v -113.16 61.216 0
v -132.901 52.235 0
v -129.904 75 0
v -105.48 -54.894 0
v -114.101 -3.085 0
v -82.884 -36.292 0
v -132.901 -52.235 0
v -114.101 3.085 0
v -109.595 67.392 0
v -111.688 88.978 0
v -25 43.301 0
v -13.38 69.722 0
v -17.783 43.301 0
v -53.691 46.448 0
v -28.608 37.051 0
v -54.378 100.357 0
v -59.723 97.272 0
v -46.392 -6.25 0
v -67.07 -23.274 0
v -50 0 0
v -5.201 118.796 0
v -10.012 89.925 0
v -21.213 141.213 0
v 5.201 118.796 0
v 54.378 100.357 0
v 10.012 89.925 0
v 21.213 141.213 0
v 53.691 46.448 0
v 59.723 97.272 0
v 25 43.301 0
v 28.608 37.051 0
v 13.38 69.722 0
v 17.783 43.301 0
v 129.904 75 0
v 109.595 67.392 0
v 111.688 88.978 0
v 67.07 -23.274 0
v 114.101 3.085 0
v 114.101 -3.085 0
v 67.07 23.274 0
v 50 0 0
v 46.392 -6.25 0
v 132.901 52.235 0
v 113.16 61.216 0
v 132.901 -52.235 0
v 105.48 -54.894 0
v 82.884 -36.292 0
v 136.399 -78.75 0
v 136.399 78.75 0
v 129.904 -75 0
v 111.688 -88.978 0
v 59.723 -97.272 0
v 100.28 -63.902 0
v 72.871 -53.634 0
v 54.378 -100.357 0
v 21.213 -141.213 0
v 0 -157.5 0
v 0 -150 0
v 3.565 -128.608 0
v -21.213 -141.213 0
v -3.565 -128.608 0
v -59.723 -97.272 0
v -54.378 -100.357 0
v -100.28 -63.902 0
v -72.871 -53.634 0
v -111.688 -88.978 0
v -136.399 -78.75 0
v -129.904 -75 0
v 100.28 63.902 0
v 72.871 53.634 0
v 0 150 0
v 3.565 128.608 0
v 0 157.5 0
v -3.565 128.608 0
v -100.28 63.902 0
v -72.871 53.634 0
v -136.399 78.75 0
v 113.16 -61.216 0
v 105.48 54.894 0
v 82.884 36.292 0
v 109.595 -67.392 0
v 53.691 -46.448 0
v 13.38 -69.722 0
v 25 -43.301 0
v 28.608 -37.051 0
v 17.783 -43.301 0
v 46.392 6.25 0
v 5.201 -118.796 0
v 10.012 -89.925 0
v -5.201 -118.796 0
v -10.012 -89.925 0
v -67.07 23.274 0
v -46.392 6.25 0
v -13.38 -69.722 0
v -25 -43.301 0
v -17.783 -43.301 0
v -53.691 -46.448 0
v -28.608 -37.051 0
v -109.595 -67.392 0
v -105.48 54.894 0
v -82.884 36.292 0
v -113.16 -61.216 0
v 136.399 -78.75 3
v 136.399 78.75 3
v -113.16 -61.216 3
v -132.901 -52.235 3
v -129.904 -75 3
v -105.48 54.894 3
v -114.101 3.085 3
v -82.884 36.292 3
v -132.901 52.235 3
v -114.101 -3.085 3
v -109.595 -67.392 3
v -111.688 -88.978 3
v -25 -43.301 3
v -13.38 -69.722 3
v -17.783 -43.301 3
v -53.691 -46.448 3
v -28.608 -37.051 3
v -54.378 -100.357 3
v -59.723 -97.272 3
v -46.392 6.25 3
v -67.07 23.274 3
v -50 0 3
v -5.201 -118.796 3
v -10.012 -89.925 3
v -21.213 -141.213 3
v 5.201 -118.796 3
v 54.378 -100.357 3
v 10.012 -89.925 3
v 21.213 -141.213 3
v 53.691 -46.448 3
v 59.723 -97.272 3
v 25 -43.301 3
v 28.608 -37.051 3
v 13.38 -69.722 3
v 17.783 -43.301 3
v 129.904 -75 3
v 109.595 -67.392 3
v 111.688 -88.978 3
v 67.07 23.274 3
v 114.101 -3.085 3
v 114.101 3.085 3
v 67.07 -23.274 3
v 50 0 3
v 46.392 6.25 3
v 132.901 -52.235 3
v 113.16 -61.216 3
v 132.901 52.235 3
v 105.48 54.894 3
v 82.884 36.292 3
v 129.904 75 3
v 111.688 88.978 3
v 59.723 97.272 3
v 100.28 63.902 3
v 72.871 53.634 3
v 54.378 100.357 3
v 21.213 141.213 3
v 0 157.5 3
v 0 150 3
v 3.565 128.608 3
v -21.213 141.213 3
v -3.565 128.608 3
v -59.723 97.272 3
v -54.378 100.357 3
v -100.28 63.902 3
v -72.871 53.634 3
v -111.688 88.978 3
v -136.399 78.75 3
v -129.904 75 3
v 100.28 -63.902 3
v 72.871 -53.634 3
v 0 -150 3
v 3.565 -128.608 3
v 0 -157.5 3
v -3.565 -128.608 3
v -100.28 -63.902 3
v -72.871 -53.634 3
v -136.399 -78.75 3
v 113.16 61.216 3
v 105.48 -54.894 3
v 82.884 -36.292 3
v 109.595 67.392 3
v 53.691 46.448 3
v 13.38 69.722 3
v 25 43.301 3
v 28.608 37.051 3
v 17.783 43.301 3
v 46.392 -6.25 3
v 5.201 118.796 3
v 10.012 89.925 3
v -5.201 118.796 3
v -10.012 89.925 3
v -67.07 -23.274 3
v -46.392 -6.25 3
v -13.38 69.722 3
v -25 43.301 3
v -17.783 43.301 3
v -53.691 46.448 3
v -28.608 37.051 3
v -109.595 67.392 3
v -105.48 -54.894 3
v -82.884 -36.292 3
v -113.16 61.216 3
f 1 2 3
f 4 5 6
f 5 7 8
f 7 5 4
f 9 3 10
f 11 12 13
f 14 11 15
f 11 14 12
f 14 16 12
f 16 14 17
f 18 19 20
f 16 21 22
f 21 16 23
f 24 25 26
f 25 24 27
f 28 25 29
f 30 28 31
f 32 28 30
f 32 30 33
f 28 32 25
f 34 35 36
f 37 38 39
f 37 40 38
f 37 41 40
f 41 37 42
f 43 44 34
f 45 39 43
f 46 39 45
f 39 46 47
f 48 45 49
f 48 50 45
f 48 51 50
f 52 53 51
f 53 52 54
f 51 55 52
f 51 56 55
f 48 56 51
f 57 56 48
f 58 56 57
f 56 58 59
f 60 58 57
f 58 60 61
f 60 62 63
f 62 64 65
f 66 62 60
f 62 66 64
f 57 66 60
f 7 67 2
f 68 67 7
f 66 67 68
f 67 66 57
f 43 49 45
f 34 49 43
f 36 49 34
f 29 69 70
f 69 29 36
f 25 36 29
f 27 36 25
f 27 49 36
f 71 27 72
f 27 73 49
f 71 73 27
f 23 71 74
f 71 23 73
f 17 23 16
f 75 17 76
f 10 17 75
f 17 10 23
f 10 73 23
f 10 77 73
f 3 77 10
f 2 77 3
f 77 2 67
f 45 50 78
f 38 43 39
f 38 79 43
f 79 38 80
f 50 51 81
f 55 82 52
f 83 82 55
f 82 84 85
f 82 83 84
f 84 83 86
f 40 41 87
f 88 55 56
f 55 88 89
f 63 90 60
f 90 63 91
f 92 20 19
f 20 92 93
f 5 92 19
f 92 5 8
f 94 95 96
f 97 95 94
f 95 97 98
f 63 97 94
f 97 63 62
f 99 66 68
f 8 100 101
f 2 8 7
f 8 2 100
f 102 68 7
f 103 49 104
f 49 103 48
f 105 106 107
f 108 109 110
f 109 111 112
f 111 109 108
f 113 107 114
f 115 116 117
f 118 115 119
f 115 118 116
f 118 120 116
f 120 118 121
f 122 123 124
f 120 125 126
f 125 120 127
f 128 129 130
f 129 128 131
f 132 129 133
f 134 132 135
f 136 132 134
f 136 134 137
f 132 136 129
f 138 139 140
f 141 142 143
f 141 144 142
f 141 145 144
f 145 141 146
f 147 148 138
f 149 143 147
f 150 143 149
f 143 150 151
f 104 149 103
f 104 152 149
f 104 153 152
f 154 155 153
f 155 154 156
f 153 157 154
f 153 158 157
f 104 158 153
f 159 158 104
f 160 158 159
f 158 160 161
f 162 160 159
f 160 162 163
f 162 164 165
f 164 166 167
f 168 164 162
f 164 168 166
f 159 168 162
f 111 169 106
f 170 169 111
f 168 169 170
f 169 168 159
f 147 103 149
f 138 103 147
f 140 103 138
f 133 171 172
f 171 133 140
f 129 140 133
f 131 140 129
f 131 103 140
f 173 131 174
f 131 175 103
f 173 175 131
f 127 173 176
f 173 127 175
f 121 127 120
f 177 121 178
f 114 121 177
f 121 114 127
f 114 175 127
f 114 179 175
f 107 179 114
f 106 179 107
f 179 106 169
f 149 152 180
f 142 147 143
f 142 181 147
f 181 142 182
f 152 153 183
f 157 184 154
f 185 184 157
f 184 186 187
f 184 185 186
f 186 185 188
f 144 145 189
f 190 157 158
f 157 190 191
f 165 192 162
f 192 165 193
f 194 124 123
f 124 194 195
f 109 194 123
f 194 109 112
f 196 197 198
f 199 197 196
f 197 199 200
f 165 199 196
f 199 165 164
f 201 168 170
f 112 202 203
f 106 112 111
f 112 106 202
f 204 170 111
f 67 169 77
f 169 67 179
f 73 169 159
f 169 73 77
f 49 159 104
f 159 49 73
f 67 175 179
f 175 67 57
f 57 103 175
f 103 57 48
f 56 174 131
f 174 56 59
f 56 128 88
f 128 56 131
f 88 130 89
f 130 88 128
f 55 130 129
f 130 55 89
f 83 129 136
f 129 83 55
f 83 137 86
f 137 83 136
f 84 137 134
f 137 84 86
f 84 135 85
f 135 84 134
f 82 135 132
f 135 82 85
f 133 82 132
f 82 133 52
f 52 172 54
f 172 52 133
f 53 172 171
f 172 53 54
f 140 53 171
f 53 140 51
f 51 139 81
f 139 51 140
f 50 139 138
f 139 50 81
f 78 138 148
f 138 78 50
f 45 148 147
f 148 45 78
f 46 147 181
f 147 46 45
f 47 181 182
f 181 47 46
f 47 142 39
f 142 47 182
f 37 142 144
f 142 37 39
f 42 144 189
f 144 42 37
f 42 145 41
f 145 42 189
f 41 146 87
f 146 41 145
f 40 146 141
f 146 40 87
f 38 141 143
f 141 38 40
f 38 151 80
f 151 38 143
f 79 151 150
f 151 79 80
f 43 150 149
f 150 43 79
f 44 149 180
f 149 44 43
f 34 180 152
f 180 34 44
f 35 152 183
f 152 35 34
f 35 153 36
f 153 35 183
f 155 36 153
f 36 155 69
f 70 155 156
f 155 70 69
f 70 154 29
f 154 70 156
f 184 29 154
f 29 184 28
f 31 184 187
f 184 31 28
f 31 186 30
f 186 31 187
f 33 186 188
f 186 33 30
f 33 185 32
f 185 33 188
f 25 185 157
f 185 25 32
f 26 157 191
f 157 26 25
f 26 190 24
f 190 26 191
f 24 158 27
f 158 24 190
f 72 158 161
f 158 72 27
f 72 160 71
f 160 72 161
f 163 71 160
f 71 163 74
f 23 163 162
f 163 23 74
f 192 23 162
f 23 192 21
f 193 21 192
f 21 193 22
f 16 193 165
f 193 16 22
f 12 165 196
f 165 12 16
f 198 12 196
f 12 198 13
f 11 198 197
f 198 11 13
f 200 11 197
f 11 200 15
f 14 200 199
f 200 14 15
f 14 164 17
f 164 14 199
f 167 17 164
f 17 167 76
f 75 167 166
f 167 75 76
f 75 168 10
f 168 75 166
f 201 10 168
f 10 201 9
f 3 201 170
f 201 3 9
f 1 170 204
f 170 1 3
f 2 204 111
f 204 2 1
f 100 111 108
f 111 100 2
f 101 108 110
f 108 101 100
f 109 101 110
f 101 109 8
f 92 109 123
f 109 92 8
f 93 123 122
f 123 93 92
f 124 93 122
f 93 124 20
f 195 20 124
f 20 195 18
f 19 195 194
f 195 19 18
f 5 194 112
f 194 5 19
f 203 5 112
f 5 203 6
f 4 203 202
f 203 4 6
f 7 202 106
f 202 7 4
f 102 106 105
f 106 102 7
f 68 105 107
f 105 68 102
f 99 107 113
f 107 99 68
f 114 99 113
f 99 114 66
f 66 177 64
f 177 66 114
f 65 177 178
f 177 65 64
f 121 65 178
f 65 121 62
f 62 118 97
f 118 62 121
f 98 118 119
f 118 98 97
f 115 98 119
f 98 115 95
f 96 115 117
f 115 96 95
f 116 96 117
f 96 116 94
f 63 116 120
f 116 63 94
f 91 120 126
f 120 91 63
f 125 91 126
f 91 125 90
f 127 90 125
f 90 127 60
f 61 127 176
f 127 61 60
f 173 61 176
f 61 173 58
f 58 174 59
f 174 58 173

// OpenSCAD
n=6; //Snowflakes are hexagonal.
y=150;//determines height of the triangles.
x=25;//determines width of the triangles.
height=3; //thickness of stencil.
tierx1=.5;//multiplyer of the width of first tier triangles.
tiery1=.4;//multiplyer of the height of first tier triangles.
tierx2=.2;//multiplyer of the width of second tier triangles.
tiery2=.2;//multiplyer of height of second tier triangles.
tier1angle=65;//turn angle of first tier triangles.
tier2angle=45;//turn angle of second tier triangles.

difference()
{

linear_extrude(height=height)
rotate([0,0,360/(2*n)])circle(y+.05*y,$fn=n);
echo(2*(y+.05*y));//diameter of stencil.

translate([0,0,-5])
linear_extrude(height=height+10)
union()
{
circle(y/3,$fn=n);

	for(i=[0:n])
	{
	rotate([0,0,i*360/n])
	{
		polygon([[x,0],[-x,0],[0,y]]);

		translate([0,y/2,0])rotate([0,0,tier1angle])
		polygon([[tierx1*x,0],[-tierx1*x,0],[0,tiery1*y]]);

		translate([0,y/2,0])rotate([0,0,-tier1angle])
		polygon([[tierx1*x,0],[-tierx1*x,0],[0,tiery1*y]]);

		translate([0,(4*y)/5,0])rotate([0,0,tier2angle])
		polygon([[tierx2*x,0],[-tierx2*x,0],[0,tiery2*y]]);

		translate([0,(4*y)/5,0])rotate([0,0,-tier2angle])
		polygon([[tierx2*x,0],[-tierx2*x,0],[0,tiery2*y]]);
		}
	}
}
}
